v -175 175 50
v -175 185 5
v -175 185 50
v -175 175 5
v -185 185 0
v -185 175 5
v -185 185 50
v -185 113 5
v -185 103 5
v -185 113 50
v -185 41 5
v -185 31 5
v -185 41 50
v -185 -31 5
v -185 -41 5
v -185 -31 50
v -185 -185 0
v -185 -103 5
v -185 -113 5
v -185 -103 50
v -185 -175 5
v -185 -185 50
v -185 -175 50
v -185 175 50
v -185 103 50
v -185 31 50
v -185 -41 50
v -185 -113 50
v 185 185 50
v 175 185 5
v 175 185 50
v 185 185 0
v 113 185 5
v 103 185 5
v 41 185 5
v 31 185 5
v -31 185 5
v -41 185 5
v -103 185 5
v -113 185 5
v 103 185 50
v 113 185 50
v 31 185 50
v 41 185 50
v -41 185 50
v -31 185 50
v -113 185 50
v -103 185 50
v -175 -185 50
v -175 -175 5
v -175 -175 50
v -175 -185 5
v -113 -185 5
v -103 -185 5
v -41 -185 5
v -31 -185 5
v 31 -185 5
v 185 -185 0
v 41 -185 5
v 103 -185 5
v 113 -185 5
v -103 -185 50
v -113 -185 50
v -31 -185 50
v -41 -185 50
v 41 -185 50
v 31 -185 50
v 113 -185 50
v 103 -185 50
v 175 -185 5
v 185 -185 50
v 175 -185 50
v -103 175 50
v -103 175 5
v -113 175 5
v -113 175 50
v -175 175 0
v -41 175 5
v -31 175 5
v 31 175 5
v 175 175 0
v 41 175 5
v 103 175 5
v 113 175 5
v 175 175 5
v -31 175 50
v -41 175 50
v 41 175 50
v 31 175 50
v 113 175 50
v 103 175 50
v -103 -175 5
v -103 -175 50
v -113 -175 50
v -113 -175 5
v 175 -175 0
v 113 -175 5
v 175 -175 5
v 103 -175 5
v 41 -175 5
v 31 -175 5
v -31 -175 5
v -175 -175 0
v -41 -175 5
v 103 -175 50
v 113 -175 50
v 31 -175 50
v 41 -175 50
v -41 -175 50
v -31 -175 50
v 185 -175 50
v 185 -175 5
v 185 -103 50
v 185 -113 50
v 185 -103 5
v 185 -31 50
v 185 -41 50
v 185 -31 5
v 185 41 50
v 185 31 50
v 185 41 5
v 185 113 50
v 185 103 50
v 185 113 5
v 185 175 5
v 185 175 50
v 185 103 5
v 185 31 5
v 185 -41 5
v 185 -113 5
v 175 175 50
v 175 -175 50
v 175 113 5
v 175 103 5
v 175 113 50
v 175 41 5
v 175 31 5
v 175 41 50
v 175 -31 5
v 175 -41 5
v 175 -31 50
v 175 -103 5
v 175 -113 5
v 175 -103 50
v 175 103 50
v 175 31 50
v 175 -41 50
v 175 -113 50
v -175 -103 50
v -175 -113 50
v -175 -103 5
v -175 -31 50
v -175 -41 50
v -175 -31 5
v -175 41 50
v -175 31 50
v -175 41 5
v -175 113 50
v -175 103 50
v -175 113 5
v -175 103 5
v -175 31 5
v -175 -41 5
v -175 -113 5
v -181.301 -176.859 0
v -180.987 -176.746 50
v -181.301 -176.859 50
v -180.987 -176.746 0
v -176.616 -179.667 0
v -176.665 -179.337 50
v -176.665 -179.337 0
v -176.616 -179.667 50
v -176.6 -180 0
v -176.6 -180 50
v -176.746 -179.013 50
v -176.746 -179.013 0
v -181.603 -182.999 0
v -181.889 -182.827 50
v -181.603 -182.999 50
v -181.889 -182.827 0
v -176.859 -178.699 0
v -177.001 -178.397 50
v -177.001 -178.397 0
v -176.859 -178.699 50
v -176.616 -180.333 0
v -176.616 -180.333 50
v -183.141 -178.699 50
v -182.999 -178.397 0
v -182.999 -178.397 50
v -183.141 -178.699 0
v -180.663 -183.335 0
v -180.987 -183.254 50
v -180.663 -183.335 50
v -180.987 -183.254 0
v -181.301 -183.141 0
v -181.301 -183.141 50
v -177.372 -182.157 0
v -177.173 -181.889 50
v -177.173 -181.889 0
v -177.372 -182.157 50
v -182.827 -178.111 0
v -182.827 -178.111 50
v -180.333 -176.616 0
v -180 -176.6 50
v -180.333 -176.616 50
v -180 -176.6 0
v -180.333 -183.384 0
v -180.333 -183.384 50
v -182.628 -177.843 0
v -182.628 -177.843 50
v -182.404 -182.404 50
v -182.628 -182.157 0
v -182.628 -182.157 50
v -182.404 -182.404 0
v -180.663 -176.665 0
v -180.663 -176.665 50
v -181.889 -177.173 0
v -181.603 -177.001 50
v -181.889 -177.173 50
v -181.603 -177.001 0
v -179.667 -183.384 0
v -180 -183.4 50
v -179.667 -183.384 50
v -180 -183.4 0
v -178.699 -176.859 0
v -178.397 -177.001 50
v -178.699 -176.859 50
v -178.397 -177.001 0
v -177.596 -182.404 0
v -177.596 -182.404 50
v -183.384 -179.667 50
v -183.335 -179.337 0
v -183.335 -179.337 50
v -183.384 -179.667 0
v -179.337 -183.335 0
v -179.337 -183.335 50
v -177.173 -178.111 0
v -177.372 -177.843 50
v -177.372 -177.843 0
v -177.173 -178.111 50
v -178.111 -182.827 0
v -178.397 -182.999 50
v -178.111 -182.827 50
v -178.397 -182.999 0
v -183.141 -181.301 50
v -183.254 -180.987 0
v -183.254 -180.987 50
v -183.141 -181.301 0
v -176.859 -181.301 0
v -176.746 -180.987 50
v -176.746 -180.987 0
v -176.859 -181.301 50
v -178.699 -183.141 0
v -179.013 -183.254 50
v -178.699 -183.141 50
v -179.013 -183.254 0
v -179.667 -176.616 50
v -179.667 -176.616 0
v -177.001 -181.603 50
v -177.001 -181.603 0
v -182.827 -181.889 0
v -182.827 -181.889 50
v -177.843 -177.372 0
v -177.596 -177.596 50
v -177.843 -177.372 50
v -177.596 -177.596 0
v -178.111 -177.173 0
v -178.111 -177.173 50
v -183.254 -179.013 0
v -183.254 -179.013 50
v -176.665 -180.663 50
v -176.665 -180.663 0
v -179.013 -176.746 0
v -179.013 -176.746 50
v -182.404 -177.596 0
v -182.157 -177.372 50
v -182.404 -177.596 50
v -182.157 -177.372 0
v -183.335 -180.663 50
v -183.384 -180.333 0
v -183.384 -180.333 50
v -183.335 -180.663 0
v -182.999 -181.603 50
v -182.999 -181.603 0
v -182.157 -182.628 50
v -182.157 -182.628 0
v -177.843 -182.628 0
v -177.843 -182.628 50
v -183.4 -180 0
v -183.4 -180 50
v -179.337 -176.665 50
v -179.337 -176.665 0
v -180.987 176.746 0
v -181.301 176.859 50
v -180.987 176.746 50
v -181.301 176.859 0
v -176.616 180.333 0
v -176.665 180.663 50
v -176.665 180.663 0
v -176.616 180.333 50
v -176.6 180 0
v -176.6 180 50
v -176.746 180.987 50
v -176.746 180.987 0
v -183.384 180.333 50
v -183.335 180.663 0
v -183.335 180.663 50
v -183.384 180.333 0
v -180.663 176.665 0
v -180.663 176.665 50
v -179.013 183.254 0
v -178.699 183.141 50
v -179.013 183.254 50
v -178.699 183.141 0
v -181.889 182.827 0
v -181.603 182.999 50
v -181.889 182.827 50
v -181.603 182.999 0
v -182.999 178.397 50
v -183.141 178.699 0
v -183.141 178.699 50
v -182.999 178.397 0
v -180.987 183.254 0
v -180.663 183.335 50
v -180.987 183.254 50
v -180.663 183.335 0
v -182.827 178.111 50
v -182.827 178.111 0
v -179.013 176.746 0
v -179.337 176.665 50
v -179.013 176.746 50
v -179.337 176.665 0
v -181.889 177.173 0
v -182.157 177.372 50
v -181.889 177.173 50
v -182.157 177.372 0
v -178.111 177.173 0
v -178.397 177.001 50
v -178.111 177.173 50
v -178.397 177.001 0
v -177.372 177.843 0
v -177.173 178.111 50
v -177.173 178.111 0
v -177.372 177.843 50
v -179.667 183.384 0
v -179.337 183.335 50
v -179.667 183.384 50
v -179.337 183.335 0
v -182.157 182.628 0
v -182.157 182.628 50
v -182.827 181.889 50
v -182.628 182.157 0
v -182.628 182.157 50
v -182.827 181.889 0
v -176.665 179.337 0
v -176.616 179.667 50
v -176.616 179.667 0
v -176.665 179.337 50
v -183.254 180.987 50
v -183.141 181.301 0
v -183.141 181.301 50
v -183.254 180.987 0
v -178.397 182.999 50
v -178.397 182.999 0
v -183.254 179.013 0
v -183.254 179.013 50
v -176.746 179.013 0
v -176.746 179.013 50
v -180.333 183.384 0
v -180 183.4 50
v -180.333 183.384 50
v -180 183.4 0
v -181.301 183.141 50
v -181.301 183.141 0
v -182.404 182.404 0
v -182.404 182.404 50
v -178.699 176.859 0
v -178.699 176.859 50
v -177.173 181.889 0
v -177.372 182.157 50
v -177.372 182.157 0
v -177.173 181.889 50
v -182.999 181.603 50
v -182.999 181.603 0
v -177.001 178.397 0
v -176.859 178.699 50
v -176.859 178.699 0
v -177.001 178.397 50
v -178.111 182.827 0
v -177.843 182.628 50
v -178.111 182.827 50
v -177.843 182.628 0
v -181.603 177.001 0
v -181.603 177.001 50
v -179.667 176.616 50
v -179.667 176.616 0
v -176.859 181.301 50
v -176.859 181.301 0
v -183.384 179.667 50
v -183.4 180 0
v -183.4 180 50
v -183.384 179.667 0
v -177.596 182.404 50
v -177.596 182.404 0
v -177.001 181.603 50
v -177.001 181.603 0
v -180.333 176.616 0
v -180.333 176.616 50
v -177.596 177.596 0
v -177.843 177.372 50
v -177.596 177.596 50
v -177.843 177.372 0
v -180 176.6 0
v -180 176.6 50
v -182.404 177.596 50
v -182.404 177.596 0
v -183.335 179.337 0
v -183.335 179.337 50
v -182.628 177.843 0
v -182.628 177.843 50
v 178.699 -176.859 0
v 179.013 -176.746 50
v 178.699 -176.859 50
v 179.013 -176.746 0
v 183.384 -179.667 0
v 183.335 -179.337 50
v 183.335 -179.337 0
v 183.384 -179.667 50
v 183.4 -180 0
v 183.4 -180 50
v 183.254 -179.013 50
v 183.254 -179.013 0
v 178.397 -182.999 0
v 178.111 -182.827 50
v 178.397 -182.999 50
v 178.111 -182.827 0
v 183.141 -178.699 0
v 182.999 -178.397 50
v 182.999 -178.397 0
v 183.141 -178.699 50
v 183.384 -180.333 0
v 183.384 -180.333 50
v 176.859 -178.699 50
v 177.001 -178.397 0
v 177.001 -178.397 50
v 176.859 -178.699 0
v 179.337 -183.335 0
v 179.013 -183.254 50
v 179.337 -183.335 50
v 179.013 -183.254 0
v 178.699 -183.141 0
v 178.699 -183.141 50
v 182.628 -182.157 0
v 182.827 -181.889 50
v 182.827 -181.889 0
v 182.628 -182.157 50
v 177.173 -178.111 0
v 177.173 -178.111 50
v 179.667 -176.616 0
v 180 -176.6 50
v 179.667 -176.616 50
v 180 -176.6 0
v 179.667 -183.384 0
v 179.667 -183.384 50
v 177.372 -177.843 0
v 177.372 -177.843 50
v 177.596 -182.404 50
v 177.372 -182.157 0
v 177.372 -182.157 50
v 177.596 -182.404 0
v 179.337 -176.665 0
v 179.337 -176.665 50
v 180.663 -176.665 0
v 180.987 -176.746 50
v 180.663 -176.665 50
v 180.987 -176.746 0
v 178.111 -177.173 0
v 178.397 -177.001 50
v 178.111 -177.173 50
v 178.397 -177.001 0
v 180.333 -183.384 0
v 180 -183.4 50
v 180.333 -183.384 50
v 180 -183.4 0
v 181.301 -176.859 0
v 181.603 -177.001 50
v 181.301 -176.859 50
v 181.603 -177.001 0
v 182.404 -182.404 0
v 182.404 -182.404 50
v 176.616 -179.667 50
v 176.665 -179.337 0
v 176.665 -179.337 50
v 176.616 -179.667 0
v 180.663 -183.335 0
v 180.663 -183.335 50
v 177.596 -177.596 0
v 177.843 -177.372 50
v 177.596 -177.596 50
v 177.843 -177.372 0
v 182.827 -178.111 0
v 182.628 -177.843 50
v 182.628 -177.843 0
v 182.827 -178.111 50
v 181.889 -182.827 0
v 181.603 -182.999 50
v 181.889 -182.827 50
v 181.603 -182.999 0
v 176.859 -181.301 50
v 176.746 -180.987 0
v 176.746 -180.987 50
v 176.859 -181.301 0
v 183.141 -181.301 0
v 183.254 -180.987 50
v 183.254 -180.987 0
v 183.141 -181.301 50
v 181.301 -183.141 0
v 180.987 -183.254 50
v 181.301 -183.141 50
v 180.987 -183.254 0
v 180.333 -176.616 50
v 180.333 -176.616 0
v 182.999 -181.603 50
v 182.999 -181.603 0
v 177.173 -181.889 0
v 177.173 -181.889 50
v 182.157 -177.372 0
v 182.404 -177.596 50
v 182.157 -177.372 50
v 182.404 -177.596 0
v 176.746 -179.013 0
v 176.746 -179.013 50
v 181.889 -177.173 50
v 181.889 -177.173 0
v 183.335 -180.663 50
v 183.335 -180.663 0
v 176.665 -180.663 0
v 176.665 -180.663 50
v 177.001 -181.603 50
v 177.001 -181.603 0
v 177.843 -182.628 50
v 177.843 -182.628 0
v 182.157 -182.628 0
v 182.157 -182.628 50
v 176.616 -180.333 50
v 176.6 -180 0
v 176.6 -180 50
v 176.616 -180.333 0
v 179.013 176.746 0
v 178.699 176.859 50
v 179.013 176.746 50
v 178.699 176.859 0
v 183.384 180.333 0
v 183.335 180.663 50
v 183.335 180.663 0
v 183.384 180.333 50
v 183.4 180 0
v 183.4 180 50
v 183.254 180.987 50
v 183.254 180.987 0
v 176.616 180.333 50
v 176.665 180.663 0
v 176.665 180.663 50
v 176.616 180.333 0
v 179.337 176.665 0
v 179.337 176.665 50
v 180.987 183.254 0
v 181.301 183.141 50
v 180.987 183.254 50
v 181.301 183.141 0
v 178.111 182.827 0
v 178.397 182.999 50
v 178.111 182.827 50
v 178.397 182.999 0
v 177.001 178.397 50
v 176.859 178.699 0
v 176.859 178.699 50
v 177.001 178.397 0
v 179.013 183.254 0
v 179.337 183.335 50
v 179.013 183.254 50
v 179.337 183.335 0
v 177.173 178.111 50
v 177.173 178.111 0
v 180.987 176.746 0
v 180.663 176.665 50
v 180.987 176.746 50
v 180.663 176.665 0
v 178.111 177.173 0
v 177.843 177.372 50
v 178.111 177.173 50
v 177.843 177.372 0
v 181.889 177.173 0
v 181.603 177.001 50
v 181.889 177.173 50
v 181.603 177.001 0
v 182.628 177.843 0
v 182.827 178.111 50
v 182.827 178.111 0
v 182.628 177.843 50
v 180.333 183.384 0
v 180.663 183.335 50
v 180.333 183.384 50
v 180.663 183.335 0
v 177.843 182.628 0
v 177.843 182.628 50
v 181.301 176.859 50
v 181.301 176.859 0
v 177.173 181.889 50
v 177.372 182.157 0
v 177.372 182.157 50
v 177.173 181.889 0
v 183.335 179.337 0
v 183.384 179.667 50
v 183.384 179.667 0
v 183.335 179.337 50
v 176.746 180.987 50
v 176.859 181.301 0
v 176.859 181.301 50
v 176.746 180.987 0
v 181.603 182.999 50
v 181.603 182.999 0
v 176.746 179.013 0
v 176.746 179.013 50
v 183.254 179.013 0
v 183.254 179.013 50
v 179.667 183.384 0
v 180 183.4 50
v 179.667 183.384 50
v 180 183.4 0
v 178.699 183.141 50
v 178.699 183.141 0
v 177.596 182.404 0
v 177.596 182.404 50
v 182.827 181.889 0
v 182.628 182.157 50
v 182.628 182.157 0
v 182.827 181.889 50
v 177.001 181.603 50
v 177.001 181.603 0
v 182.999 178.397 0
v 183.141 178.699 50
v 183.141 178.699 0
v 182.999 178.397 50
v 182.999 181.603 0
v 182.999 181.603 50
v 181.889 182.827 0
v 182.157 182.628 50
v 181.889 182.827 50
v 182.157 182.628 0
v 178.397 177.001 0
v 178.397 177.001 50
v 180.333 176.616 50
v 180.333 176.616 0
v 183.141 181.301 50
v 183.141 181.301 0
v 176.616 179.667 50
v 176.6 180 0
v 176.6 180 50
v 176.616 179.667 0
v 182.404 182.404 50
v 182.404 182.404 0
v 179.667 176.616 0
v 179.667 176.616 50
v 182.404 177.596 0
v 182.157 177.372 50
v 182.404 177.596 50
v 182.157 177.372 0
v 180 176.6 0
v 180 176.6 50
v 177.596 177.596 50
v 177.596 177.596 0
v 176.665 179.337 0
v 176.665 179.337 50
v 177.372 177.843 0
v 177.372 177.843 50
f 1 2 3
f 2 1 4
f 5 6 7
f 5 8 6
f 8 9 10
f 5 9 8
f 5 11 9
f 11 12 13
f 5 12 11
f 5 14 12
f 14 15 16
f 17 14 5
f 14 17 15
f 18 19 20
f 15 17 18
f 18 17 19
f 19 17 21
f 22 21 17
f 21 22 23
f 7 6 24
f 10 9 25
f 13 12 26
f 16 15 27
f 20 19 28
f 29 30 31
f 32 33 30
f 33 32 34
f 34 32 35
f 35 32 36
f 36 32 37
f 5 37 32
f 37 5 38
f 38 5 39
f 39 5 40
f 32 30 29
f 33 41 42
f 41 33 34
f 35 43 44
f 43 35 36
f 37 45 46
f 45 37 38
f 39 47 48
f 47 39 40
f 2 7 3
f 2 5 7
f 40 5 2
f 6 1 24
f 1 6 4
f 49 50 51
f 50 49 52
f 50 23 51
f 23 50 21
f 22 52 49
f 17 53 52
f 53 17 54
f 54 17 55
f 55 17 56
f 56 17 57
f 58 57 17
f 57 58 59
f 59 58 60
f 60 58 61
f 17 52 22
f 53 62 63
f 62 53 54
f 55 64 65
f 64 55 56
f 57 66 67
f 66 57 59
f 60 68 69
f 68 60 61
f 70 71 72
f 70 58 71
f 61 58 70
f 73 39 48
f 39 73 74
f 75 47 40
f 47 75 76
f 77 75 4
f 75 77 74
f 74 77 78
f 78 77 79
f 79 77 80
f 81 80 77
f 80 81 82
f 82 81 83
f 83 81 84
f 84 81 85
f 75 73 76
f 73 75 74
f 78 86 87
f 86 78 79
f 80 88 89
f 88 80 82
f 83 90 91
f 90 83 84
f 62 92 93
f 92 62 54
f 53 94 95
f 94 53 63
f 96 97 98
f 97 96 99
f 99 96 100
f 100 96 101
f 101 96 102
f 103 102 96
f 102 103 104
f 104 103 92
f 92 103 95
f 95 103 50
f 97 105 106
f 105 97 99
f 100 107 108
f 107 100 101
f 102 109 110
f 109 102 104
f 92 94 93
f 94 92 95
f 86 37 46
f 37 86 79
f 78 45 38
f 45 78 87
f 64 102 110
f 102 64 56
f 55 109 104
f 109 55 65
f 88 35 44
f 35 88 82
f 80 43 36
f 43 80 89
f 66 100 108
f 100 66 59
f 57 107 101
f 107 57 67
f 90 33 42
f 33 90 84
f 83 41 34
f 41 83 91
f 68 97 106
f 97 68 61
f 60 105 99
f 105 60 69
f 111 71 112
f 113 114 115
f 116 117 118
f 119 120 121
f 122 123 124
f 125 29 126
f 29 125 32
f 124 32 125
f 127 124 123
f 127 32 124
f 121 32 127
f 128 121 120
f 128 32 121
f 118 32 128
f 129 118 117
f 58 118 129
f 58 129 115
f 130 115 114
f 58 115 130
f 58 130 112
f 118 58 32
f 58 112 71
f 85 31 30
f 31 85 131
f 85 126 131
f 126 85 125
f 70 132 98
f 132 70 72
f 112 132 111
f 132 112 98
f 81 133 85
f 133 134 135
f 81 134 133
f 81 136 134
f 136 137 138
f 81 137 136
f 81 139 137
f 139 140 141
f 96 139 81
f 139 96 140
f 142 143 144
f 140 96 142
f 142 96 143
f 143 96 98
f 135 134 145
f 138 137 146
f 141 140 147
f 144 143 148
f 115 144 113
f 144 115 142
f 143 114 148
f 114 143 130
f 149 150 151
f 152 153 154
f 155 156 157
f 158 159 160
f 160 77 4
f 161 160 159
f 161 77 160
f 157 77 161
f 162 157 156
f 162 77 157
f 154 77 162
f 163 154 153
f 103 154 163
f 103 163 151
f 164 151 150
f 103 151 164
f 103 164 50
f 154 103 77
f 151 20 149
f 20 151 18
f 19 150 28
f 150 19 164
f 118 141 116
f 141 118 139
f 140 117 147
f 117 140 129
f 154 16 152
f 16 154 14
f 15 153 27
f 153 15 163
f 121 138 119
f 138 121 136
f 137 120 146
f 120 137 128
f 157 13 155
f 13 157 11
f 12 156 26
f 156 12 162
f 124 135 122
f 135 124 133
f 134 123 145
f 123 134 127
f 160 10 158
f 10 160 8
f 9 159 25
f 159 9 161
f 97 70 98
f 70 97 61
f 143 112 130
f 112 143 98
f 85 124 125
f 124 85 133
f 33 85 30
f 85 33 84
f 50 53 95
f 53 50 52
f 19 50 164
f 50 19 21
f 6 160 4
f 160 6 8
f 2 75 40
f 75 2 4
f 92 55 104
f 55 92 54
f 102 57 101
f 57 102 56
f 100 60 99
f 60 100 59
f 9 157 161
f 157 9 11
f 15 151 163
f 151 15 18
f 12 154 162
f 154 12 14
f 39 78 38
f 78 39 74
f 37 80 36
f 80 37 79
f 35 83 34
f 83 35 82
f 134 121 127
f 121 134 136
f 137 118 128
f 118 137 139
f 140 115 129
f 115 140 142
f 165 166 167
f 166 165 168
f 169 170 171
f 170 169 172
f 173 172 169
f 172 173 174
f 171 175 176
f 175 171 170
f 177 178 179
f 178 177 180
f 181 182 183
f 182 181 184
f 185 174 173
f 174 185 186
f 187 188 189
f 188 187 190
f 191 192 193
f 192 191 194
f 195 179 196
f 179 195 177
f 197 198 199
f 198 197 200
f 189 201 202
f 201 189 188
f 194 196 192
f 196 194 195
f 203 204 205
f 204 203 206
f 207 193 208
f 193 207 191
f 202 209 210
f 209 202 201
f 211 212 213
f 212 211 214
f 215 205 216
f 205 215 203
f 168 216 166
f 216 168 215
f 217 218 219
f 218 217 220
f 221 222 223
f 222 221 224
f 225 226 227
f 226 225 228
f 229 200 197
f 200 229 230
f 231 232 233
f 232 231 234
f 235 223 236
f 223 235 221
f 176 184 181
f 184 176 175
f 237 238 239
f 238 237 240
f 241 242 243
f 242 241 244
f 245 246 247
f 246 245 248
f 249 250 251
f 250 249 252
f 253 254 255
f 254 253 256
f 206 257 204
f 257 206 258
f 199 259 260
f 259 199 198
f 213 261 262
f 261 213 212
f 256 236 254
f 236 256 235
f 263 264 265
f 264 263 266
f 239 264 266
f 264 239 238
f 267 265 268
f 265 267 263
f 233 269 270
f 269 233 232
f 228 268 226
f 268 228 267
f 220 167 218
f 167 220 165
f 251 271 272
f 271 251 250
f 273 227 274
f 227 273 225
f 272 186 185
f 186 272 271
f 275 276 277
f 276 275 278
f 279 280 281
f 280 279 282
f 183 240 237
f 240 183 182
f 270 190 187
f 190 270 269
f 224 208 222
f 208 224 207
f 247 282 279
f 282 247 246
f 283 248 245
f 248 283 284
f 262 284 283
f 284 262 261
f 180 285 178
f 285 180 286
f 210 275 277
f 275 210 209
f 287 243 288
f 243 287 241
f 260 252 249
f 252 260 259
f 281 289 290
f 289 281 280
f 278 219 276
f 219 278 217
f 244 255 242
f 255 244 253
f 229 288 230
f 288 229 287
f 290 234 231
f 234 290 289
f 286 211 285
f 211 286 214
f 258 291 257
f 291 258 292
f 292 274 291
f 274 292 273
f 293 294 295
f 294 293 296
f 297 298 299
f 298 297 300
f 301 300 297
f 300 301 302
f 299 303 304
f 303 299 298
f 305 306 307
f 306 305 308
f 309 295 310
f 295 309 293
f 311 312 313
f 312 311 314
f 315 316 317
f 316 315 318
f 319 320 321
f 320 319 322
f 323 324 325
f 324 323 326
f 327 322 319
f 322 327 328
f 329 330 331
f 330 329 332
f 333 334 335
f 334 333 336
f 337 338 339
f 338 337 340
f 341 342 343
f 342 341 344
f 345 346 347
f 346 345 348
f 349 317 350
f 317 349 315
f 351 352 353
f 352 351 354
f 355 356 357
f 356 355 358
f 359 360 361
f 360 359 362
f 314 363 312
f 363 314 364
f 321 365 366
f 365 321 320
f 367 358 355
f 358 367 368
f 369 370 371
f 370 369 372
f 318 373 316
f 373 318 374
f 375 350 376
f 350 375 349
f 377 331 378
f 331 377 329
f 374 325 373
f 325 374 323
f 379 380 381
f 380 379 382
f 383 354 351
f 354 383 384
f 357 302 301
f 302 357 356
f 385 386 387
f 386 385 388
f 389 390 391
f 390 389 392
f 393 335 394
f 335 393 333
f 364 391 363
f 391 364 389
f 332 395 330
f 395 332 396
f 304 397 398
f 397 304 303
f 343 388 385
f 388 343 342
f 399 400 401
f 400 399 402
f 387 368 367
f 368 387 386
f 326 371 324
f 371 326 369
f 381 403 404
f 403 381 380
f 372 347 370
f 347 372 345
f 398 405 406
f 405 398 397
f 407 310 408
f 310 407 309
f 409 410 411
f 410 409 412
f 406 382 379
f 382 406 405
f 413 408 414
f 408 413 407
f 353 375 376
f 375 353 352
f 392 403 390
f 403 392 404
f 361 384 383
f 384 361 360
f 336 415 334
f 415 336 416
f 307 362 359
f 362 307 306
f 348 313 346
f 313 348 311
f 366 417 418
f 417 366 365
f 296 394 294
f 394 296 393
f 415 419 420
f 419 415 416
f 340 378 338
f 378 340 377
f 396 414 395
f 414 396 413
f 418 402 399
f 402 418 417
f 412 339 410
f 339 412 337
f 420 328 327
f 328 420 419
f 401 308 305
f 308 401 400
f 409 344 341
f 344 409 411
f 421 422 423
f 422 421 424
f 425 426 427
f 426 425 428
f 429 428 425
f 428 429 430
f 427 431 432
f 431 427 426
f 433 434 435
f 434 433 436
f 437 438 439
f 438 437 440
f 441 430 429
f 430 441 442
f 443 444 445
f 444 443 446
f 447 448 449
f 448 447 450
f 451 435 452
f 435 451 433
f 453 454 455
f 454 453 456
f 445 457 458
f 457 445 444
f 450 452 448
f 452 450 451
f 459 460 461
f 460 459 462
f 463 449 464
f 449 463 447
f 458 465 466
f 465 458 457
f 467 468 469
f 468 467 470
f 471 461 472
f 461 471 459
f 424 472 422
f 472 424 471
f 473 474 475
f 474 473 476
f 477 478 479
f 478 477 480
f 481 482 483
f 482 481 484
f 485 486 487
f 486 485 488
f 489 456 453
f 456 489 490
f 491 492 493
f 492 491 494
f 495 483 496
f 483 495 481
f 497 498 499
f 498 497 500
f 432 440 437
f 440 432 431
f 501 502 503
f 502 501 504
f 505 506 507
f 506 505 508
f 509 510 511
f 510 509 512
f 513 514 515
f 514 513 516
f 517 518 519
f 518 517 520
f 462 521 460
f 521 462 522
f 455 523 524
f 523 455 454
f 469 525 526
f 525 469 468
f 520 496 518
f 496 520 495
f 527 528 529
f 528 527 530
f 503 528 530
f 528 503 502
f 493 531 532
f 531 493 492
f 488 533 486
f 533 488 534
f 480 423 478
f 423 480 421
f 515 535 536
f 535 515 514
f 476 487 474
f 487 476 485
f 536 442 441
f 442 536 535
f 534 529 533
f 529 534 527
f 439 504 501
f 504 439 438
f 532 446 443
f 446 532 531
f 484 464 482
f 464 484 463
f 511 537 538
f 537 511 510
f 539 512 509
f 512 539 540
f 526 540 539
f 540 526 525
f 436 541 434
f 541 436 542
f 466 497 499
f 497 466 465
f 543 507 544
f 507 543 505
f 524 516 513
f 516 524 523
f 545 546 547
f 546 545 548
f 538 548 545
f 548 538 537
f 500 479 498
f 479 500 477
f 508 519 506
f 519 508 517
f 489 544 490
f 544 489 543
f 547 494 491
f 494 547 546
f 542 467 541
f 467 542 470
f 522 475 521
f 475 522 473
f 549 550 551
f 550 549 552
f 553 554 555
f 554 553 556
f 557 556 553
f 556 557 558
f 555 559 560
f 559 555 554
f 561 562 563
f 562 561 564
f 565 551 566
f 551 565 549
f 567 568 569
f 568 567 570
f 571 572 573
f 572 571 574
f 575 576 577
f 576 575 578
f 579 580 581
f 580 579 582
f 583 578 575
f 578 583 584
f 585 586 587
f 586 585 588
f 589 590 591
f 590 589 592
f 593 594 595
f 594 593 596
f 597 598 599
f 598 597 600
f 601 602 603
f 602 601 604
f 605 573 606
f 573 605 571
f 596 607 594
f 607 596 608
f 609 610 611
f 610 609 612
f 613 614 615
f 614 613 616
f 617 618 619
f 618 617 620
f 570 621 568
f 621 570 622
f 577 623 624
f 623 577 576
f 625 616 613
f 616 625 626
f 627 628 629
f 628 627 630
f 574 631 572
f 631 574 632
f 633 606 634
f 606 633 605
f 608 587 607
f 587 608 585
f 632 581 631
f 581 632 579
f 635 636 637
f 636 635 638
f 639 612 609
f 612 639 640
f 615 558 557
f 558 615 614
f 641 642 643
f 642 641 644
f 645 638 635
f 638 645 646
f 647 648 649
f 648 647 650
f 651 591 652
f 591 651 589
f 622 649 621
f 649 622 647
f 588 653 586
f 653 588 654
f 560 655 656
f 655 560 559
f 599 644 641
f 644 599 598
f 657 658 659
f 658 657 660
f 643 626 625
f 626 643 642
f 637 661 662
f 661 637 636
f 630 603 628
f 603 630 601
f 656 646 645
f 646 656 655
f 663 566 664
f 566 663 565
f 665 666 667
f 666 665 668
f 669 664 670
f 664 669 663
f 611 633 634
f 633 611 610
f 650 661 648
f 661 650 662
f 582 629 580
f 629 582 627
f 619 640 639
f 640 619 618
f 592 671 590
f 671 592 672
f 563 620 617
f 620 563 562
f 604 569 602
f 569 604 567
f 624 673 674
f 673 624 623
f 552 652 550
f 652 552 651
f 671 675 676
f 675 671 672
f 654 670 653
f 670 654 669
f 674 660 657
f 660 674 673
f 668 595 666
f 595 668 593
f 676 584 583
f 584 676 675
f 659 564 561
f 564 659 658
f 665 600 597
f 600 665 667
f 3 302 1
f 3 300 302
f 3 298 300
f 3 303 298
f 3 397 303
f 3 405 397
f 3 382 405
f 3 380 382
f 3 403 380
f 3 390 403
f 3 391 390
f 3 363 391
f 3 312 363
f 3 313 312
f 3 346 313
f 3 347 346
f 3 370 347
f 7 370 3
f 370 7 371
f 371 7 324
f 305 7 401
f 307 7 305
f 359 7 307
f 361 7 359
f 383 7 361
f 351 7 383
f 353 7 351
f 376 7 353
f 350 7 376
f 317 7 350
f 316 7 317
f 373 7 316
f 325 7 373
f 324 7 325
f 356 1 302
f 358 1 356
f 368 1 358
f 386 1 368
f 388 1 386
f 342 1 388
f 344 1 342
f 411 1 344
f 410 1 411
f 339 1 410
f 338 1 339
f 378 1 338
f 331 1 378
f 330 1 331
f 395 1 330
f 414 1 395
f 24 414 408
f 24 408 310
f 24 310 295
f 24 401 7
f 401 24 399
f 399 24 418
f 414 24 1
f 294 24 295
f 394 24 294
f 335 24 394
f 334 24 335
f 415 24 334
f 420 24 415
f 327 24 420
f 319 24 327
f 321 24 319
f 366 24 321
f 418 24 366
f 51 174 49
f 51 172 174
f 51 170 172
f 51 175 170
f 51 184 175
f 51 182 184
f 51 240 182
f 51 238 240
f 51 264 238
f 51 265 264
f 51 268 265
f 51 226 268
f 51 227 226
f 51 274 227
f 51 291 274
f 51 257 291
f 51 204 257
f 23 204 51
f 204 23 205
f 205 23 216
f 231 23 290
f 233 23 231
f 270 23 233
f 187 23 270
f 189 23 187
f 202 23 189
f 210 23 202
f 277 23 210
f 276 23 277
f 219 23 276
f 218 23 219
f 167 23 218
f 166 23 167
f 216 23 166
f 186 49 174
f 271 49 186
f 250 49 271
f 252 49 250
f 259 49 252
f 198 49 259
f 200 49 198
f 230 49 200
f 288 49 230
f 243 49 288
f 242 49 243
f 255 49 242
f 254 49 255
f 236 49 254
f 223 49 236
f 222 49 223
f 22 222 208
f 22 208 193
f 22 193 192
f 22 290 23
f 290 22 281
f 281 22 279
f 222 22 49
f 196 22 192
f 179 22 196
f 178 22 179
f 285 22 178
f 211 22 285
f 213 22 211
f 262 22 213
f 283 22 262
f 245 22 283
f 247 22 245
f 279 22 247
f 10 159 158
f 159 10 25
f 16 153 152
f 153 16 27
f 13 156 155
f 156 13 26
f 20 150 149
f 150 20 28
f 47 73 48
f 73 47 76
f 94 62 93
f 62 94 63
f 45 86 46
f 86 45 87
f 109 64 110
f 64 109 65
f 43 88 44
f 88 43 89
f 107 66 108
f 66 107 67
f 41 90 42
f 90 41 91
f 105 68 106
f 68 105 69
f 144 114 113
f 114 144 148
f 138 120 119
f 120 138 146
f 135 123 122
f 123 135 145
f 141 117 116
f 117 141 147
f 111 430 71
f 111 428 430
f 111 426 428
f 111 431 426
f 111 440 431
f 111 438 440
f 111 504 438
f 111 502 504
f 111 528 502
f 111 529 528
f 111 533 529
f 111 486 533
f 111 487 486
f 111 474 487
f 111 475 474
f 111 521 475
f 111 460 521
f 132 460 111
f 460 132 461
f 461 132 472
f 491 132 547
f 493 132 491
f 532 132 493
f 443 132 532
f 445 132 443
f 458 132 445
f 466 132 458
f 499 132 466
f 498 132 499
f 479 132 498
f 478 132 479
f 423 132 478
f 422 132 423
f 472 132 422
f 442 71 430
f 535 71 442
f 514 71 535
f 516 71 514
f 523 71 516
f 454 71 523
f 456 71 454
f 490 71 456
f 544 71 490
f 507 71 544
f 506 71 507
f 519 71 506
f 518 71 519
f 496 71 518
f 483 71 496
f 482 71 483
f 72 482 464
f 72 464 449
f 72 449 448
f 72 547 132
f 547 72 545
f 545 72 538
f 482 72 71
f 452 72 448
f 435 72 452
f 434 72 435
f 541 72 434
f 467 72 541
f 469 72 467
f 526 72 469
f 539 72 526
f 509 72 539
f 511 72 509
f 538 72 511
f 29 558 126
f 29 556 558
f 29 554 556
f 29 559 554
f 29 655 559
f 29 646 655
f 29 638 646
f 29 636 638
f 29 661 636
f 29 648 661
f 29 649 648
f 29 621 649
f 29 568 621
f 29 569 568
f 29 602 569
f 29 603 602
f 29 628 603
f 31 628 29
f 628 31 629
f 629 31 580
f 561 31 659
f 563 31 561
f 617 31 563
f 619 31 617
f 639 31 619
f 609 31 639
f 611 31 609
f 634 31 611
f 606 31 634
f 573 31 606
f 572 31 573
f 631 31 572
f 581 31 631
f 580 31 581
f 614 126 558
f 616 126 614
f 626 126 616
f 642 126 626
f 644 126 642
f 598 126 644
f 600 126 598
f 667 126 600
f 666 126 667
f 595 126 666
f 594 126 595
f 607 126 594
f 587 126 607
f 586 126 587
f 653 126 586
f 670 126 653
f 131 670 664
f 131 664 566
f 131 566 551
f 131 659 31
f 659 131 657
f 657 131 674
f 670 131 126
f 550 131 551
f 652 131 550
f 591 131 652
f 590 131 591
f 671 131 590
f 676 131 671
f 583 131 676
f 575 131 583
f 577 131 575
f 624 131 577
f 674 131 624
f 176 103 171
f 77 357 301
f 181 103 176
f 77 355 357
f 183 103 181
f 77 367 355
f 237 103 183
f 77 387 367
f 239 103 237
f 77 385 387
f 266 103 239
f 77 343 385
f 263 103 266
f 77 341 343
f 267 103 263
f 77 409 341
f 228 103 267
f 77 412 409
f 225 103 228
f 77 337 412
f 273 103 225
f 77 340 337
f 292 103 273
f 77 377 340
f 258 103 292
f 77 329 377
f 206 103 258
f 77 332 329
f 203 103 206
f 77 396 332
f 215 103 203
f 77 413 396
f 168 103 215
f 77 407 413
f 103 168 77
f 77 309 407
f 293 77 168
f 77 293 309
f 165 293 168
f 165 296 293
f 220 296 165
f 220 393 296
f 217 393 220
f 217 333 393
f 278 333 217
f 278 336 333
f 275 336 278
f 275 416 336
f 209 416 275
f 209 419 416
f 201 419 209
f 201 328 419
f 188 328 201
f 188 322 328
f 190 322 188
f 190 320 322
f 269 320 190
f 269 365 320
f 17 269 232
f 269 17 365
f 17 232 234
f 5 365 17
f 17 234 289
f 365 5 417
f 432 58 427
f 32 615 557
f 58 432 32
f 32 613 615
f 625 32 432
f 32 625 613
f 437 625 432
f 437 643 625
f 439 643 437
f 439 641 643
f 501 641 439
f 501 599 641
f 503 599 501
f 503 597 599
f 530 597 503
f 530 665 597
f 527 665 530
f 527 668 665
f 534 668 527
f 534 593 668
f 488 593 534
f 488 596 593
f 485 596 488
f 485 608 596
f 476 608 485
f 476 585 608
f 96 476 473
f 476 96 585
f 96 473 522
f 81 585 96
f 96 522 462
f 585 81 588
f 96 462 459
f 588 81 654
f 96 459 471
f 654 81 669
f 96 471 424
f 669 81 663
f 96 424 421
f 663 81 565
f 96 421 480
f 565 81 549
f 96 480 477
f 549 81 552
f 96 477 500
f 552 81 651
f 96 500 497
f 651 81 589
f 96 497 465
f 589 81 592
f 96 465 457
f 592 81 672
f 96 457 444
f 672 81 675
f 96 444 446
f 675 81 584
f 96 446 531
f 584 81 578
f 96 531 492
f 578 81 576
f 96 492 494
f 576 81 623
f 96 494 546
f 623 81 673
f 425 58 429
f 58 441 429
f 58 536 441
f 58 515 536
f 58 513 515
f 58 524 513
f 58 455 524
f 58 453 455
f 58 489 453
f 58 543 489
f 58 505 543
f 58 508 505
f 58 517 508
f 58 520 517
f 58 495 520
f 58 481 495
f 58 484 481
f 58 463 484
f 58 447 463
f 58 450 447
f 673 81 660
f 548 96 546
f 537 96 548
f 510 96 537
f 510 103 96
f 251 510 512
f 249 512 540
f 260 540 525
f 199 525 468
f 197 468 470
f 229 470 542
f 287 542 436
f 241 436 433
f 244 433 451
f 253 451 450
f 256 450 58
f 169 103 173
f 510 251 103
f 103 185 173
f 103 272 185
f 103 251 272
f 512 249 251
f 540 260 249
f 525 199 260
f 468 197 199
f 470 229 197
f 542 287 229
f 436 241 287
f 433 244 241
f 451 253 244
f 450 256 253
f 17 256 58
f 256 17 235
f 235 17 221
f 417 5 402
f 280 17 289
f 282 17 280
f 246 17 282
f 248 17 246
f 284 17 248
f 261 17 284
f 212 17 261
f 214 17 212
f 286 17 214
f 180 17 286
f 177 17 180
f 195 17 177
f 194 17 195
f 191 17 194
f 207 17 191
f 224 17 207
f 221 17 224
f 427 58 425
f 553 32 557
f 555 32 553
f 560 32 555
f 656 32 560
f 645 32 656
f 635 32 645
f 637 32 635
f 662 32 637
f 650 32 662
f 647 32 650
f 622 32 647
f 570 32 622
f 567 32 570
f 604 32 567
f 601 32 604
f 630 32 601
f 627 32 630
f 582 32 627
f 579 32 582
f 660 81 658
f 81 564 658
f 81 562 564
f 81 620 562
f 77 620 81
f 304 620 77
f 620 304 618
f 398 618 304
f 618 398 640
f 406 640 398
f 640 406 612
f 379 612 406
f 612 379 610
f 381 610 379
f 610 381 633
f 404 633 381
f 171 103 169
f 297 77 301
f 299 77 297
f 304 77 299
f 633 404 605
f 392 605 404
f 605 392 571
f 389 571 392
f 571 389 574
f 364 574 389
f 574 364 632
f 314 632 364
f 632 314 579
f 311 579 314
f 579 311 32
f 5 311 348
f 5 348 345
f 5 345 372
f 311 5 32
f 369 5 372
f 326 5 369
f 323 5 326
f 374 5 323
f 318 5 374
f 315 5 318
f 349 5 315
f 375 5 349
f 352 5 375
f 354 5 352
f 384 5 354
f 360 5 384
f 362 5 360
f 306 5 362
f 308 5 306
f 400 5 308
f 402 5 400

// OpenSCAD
// Cage slice part (z0..z1). Units: mm.
// Print orientation: normal

bar=10;
inner=[350,350,700];
gap_xy=62;
gap_z=61;
hole_d=6.8;
$fn=64;

outer=[inner[0]+2*bar, inner[1]+2*bar, inner[2]+2*bar];
half=[outer[0]/2, outer[1]/2, outer[2]/2];

pitch_xy=bar+gap_xy;
pitch_z=bar+gap_z;

centers=[for(i=[0:5]) -(half[0]-bar/2) + i*pitch_xy];
z_levels=[for(i=[0:10]) i*pitch_z];

module vbar(xc,yc){ translate([xc-bar/2,yc-bar/2,0]) cube([bar,bar,outer[2]],center=false); }
module hbar_x(yc,z0){ translate([-half[0],yc-bar/2,z0]) cube([outer[0],bar,bar],center=false); }
module hbar_y(xc,z0){ translate([xc-bar/2,-half[1],z0]) cube([bar,outer[1],bar],center=false); }

module grid(z0){ union(){ for(yc=centers) hbar_x(yc,z0); for(xc=centers) hbar_y(xc,z0); } }

module side_verticals(){
  union(){
    for(xc=centers){ vbar(xc, half[1]-bar/2); vbar(xc,-half[1]+bar/2); }
    for(yc=centers){ vbar( half[0]-bar/2,yc); vbar(-half[0]+bar/2,yc); }
  }
}

module side_rings(){
  union(){
    for(z0=z_levels){
      hbar_x( half[1]-bar/2,z0); hbar_x(-half[1]+bar/2,z0);
      hbar_y( half[0]-bar/2,z0); hbar_y(-half[0]+bar/2,z0);
    }
  }
}

module rod_holes(){
  for(sx=[-1,1],sy=[-1,1]) translate([sx*(half[0]-bar/2), sy*(half[1]-bar/2), -1]) cylinder(d=hole_d,h=outer[2]+2,center=false);
}

module cage(){ difference(){ union(){ side_verticals(); side_rings(); grid(0); grid(outer[2]-bar); } rod_holes(); } }

module cage_slice(zmin,zmax){ intersection(){ cage(); translate([-1000,-1000,zmin]) cube([2000,2000,zmax-zmin],center=false); } }

z0=644; z1=694;
translate([0,0,-z0]) cage_slice(z0,z1);
